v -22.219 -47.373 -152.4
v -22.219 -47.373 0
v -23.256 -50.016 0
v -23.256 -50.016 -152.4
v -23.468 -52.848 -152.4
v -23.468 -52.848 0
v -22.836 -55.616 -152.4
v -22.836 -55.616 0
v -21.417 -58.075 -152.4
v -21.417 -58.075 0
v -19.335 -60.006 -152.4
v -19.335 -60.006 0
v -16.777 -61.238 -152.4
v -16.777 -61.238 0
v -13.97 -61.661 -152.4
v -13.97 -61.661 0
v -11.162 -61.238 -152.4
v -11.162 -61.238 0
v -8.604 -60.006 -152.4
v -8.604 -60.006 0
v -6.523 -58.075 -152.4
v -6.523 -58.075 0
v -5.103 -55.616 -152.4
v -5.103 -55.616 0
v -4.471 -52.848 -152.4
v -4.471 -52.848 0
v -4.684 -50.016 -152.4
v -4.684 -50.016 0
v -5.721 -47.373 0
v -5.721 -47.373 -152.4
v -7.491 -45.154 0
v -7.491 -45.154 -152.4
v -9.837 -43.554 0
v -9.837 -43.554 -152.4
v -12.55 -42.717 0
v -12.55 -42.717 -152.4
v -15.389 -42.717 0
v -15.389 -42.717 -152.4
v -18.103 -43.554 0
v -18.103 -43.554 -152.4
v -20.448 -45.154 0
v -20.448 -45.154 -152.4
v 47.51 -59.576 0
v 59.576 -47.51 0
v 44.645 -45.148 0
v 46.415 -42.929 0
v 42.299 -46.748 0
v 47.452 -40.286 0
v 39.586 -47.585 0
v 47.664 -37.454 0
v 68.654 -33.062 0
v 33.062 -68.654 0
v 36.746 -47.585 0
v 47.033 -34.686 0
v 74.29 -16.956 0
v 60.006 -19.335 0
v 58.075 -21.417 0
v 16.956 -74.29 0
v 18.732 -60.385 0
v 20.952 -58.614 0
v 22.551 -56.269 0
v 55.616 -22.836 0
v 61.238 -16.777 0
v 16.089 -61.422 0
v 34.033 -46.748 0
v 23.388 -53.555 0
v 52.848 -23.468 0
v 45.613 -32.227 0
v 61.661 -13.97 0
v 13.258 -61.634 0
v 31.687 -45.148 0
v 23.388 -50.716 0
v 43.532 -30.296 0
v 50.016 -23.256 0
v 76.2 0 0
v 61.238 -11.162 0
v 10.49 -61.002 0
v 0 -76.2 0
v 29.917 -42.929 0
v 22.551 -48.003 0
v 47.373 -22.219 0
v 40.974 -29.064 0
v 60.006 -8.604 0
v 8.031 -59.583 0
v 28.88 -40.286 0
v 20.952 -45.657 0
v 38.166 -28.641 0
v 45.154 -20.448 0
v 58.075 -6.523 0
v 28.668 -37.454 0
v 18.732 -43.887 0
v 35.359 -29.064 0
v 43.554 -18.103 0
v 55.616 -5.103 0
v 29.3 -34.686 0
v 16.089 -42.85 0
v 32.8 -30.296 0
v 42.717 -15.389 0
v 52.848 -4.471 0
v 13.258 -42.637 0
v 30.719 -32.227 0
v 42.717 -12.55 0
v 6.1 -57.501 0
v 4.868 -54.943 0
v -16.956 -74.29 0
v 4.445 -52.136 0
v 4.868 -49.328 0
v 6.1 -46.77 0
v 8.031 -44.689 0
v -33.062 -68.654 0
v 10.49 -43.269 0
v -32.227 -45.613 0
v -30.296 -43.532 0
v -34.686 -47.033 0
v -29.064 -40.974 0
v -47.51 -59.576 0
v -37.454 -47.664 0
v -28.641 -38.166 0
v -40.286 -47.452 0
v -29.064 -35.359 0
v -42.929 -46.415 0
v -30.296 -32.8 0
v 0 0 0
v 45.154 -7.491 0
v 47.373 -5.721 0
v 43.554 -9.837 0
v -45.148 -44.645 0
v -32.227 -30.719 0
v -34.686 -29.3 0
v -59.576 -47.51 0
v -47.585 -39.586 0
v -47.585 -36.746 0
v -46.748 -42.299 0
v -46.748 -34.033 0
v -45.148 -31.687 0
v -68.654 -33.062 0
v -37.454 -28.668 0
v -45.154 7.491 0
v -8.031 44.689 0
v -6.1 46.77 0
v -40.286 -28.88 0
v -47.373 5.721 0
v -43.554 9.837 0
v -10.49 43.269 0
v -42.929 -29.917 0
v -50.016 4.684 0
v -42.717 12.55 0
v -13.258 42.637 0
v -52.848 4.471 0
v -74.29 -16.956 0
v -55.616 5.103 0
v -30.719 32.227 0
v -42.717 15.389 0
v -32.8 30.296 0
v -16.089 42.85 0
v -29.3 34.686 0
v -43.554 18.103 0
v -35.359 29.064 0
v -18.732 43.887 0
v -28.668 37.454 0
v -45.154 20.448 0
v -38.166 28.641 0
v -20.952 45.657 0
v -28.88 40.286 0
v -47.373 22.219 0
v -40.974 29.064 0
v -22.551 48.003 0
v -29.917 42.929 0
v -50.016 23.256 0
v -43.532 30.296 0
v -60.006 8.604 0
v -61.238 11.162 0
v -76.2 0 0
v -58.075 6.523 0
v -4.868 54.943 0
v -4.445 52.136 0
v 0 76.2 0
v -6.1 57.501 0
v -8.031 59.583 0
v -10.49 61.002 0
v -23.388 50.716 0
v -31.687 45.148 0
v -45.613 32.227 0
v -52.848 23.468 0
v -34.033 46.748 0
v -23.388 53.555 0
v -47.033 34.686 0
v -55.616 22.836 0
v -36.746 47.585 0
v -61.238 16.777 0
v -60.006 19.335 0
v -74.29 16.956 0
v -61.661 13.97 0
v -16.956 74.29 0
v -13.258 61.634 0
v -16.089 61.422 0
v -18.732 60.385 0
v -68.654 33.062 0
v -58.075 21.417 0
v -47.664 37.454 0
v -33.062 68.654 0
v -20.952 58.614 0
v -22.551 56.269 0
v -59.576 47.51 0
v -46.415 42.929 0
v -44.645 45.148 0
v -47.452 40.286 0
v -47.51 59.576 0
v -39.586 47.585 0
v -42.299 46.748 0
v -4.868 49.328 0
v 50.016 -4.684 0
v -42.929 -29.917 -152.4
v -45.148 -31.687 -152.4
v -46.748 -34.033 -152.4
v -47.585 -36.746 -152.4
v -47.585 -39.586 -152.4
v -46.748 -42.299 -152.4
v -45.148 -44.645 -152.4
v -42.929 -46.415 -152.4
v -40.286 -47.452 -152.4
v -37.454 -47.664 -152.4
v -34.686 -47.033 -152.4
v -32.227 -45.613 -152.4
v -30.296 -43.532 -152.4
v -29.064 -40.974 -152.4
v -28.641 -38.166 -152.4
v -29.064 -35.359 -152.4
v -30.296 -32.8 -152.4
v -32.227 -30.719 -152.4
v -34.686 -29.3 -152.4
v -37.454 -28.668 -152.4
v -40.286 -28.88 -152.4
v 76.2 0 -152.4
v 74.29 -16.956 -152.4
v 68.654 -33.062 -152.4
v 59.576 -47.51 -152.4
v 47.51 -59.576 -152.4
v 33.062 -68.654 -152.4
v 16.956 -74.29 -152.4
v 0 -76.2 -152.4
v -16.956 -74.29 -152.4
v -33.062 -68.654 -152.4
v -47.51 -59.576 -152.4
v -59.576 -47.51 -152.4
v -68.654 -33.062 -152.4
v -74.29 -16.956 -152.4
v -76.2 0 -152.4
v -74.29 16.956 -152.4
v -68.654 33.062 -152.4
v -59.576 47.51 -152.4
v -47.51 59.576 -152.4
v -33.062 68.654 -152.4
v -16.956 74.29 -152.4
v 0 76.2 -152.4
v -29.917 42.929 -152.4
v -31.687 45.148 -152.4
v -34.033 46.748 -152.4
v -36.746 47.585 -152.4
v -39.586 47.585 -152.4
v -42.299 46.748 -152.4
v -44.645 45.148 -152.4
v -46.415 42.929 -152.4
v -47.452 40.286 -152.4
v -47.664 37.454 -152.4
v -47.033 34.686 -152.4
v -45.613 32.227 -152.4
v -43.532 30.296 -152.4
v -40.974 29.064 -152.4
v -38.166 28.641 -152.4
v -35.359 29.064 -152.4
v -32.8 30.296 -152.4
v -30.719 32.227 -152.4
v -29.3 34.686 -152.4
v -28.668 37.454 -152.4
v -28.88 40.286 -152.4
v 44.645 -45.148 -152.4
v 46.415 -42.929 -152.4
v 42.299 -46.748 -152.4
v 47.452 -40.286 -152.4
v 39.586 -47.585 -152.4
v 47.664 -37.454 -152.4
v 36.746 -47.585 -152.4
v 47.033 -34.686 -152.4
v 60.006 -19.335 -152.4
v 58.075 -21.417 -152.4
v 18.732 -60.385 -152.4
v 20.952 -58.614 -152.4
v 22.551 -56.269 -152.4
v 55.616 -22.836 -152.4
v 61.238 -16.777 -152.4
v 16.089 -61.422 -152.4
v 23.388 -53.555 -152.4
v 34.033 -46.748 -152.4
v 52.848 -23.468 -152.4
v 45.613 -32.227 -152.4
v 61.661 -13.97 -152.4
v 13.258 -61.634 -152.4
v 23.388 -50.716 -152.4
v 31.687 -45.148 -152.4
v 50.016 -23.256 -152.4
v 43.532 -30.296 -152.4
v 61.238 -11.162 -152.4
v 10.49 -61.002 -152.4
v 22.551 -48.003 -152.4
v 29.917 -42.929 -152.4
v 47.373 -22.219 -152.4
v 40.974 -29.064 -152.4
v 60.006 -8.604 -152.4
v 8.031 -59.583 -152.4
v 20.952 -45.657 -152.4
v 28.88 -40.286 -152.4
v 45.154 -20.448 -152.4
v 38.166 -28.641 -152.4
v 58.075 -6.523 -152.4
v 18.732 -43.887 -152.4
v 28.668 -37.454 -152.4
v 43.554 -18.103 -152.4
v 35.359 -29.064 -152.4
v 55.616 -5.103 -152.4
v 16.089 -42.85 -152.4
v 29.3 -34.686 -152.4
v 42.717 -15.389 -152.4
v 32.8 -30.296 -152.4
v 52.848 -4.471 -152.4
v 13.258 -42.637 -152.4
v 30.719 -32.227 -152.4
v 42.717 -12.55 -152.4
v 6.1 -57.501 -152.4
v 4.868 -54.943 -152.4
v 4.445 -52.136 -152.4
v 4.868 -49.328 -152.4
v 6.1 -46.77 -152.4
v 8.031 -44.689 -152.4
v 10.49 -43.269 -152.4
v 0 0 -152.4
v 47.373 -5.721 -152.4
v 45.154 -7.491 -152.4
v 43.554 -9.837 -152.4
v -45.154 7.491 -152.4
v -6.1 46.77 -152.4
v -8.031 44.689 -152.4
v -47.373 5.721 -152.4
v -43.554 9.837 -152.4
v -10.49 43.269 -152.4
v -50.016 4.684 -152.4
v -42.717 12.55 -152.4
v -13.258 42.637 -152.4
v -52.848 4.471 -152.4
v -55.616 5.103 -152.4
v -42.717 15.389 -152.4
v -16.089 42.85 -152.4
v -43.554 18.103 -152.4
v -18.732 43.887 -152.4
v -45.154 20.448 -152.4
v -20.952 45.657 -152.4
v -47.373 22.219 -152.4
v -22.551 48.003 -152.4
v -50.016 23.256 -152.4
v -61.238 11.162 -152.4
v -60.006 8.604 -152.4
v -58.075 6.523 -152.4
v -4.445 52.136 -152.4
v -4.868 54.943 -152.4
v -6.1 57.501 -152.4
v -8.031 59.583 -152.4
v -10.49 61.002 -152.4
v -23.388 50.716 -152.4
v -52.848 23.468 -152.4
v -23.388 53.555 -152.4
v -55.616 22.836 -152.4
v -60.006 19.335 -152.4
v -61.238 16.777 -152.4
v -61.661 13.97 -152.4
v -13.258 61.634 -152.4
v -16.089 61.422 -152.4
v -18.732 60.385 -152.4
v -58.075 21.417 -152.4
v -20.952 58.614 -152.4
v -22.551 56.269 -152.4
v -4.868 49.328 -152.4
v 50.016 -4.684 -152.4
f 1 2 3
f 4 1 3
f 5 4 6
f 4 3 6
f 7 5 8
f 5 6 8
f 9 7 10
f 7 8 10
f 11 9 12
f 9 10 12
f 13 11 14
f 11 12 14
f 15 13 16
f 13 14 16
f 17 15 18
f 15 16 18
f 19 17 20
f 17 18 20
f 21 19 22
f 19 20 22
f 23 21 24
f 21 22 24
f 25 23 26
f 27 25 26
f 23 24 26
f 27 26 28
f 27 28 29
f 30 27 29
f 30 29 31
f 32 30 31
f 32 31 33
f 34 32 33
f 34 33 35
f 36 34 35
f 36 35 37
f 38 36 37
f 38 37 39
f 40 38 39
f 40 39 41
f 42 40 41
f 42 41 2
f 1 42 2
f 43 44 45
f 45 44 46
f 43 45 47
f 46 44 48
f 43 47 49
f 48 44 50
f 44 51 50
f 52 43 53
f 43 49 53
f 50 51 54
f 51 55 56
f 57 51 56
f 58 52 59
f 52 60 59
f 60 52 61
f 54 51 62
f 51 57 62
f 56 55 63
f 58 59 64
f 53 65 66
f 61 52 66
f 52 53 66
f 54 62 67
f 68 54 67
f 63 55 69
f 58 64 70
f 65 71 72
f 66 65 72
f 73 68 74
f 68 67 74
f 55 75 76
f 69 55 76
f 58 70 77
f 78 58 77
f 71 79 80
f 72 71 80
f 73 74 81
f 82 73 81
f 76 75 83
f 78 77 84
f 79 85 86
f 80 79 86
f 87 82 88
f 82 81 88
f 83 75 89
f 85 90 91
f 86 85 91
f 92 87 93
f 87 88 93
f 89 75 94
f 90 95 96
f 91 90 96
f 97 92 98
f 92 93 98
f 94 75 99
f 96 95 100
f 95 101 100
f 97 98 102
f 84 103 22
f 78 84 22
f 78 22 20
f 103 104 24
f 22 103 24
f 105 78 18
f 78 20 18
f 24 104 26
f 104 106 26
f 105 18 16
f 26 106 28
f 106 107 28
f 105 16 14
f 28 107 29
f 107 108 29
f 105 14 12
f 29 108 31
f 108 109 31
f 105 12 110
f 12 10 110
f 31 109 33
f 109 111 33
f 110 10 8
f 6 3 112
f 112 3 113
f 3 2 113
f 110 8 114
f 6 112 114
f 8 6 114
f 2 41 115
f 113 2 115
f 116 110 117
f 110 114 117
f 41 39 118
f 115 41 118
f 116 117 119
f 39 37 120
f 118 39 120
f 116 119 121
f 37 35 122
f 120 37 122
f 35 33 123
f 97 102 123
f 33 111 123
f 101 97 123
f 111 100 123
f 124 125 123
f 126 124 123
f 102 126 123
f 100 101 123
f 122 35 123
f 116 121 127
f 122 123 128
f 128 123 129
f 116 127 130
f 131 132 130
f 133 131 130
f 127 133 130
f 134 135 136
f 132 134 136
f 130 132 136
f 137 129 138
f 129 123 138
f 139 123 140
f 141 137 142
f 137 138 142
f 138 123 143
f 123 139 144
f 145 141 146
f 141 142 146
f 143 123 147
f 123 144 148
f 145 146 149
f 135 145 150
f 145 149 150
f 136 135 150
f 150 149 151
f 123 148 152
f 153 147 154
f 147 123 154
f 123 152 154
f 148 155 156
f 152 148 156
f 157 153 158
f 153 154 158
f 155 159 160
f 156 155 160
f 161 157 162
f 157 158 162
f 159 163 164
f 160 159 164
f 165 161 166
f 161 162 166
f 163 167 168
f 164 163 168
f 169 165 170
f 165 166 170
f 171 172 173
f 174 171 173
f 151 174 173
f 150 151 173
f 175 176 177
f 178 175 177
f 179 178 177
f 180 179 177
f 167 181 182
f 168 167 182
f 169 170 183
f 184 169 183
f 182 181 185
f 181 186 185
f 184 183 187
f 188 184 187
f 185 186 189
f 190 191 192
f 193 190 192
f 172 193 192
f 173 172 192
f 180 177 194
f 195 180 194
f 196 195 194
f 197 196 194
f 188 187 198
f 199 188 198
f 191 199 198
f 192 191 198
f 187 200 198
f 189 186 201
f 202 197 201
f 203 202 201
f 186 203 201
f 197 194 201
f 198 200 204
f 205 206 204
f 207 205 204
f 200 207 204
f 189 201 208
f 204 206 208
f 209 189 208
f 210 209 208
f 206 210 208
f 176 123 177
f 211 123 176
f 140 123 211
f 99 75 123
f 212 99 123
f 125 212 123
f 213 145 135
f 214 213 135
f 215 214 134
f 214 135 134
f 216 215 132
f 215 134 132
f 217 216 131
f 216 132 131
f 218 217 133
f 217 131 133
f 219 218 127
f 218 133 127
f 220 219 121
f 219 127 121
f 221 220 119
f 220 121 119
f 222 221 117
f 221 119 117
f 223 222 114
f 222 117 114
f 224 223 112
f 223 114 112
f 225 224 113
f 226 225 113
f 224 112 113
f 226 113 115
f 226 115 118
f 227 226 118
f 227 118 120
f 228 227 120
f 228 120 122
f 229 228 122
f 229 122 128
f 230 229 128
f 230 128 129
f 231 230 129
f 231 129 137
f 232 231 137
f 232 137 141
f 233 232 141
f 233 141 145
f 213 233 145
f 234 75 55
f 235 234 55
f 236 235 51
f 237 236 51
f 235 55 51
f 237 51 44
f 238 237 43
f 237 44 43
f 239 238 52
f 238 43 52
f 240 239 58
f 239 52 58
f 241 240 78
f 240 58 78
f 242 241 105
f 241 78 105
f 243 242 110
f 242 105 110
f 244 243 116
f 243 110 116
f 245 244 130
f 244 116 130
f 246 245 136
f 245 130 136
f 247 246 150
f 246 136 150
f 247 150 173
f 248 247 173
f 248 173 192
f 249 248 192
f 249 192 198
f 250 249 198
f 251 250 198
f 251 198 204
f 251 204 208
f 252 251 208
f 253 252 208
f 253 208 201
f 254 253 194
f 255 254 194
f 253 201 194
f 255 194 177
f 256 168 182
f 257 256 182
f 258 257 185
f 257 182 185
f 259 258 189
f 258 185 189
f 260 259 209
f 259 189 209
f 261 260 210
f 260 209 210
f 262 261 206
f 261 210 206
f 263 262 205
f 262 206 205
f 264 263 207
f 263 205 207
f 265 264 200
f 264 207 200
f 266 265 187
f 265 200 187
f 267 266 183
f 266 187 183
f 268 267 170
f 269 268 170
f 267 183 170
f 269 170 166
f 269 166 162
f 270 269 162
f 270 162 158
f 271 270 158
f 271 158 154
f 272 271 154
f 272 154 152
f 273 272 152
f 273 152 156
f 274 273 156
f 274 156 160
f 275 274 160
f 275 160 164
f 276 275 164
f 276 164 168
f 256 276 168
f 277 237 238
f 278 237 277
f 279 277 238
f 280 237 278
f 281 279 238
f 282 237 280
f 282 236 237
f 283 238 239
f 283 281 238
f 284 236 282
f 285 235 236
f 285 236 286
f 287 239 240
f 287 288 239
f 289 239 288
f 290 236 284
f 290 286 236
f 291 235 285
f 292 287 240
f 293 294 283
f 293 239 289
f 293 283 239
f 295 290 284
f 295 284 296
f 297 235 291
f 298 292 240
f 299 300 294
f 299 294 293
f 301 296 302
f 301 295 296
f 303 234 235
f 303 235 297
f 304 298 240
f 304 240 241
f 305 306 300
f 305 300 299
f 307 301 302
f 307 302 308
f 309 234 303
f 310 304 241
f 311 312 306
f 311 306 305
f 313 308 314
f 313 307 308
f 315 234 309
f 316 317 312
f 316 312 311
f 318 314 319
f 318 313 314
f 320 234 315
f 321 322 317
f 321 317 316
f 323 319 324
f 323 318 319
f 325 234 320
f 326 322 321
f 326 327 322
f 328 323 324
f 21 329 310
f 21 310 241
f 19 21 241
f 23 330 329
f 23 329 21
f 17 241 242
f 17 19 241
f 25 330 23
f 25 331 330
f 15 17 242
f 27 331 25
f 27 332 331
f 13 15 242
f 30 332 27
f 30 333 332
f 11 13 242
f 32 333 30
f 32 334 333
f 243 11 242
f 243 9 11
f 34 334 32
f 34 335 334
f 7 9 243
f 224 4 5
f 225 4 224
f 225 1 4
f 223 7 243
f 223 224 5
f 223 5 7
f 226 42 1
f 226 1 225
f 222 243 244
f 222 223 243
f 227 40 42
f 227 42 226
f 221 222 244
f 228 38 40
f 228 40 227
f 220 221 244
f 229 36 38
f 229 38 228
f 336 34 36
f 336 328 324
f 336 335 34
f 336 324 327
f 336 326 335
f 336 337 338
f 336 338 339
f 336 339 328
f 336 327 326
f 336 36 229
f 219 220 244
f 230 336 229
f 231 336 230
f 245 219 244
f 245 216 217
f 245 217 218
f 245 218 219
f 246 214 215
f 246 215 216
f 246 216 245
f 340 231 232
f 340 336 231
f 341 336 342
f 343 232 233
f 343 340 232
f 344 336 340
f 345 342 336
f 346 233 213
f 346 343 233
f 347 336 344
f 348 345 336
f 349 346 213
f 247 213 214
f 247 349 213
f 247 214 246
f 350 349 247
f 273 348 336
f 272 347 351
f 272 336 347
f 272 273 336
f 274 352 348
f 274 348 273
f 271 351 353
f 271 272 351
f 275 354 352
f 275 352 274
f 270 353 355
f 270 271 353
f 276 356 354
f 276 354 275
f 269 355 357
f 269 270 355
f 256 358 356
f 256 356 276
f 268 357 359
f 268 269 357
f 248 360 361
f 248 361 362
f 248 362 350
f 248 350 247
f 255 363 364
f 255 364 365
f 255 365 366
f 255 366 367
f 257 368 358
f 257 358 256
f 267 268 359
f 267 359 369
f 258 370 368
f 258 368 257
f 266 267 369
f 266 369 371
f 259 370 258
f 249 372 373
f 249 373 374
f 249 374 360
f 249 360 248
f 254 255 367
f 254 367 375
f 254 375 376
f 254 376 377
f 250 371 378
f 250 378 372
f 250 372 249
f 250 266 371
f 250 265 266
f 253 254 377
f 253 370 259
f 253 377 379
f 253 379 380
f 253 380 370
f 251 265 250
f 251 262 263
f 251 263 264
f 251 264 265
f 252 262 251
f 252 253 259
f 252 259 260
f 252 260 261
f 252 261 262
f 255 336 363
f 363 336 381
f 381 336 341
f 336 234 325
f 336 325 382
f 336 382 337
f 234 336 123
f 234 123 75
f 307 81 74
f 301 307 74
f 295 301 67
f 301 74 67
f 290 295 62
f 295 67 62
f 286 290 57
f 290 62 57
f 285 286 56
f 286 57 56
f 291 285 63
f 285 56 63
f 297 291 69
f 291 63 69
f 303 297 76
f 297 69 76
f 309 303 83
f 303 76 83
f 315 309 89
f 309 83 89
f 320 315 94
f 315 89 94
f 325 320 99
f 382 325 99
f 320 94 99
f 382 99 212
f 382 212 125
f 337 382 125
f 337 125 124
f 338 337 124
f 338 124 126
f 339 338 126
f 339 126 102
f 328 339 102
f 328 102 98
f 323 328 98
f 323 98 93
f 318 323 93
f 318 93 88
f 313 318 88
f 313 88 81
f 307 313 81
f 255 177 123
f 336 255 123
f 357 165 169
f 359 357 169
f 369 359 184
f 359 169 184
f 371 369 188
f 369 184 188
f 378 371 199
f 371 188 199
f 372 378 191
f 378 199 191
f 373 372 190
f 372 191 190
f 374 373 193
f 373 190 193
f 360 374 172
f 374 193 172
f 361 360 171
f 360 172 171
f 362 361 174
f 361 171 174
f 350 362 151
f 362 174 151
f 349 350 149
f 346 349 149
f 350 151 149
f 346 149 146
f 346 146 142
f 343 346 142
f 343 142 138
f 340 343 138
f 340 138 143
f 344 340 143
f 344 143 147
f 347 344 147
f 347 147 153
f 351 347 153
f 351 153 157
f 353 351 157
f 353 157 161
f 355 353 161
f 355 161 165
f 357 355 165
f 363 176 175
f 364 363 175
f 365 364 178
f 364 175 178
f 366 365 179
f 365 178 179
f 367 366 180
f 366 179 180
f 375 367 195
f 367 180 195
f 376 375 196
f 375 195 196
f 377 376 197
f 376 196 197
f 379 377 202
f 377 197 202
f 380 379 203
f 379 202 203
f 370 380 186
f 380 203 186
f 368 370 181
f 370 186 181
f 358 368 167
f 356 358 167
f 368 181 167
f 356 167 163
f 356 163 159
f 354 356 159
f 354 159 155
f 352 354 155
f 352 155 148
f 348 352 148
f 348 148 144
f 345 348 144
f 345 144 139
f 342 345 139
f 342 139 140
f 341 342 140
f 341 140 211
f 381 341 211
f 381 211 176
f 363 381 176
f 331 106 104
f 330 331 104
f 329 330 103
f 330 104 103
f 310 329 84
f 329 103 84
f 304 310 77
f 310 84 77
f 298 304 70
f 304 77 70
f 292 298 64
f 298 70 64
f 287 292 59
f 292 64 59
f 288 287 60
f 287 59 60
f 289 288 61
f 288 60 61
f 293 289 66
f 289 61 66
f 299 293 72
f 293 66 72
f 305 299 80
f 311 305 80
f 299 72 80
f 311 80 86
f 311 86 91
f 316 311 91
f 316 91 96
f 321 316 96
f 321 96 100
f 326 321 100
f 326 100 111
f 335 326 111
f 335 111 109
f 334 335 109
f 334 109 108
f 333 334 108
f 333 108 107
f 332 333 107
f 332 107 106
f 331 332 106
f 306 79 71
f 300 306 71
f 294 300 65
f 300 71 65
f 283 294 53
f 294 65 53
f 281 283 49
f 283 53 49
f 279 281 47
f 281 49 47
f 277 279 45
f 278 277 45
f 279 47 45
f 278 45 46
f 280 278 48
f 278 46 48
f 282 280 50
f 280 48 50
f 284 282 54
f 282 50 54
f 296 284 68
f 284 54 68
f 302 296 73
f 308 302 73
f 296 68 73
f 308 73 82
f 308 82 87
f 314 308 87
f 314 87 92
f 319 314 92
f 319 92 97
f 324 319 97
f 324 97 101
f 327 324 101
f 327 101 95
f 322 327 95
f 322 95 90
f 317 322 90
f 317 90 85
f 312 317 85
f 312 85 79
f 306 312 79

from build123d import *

# Parameters (mm, degrees)
BOSS_EXTRUDE1_DEPTH = 152.4
SKETCH2_R           = 9.525
CUT_EXTRUDE1_DEPTH  = 187.6511184
CIRPATTERN1_COUNT   = 9
CIRPATTERN1_ANGLE   = 240


with BuildPart() as part:
    # Sketch1 → Boss-Extrude1 (new body)
    with BuildSketch(Plane.XY):
        with BuildLine():
            Line((0, 76.2), (0, 0))
            Line((0, 0), (76.2, 0))
            ThreePointArc((76.2, 0), (-53.881536726, -53.881536726), (0, 76.2))
        make_face()
    extrude(amount=-BOSS_EXTRUDE1_DEPTH)

    # Sketch2 → Cut-Extrude1 (cut, through all)
    with BuildSketch(Plane.XY):
        with Locations((-13.969757959, 52.135846474)):
            Circle(SKETCH2_R)
    cut_extrude1 = extrude(amount=-CUT_EXTRUDE1_DEPTH, mode=Mode.SUBTRACT)

    # CirPattern1: Cut-Extrude1 ×9 about axis, 1 skipped
    cirpattern1_axis = Axis((0, 0, 0), (0, 0, 1))
    add([cut_extrude1.rotate(cirpattern1_axis, i * CIRPATTERN1_ANGLE / (CIRPATTERN1_COUNT - 1)) for i in range(1, CIRPATTERN1_COUNT) if i not in (3,)], mode=Mode.SUBTRACT)


solid = part.part
